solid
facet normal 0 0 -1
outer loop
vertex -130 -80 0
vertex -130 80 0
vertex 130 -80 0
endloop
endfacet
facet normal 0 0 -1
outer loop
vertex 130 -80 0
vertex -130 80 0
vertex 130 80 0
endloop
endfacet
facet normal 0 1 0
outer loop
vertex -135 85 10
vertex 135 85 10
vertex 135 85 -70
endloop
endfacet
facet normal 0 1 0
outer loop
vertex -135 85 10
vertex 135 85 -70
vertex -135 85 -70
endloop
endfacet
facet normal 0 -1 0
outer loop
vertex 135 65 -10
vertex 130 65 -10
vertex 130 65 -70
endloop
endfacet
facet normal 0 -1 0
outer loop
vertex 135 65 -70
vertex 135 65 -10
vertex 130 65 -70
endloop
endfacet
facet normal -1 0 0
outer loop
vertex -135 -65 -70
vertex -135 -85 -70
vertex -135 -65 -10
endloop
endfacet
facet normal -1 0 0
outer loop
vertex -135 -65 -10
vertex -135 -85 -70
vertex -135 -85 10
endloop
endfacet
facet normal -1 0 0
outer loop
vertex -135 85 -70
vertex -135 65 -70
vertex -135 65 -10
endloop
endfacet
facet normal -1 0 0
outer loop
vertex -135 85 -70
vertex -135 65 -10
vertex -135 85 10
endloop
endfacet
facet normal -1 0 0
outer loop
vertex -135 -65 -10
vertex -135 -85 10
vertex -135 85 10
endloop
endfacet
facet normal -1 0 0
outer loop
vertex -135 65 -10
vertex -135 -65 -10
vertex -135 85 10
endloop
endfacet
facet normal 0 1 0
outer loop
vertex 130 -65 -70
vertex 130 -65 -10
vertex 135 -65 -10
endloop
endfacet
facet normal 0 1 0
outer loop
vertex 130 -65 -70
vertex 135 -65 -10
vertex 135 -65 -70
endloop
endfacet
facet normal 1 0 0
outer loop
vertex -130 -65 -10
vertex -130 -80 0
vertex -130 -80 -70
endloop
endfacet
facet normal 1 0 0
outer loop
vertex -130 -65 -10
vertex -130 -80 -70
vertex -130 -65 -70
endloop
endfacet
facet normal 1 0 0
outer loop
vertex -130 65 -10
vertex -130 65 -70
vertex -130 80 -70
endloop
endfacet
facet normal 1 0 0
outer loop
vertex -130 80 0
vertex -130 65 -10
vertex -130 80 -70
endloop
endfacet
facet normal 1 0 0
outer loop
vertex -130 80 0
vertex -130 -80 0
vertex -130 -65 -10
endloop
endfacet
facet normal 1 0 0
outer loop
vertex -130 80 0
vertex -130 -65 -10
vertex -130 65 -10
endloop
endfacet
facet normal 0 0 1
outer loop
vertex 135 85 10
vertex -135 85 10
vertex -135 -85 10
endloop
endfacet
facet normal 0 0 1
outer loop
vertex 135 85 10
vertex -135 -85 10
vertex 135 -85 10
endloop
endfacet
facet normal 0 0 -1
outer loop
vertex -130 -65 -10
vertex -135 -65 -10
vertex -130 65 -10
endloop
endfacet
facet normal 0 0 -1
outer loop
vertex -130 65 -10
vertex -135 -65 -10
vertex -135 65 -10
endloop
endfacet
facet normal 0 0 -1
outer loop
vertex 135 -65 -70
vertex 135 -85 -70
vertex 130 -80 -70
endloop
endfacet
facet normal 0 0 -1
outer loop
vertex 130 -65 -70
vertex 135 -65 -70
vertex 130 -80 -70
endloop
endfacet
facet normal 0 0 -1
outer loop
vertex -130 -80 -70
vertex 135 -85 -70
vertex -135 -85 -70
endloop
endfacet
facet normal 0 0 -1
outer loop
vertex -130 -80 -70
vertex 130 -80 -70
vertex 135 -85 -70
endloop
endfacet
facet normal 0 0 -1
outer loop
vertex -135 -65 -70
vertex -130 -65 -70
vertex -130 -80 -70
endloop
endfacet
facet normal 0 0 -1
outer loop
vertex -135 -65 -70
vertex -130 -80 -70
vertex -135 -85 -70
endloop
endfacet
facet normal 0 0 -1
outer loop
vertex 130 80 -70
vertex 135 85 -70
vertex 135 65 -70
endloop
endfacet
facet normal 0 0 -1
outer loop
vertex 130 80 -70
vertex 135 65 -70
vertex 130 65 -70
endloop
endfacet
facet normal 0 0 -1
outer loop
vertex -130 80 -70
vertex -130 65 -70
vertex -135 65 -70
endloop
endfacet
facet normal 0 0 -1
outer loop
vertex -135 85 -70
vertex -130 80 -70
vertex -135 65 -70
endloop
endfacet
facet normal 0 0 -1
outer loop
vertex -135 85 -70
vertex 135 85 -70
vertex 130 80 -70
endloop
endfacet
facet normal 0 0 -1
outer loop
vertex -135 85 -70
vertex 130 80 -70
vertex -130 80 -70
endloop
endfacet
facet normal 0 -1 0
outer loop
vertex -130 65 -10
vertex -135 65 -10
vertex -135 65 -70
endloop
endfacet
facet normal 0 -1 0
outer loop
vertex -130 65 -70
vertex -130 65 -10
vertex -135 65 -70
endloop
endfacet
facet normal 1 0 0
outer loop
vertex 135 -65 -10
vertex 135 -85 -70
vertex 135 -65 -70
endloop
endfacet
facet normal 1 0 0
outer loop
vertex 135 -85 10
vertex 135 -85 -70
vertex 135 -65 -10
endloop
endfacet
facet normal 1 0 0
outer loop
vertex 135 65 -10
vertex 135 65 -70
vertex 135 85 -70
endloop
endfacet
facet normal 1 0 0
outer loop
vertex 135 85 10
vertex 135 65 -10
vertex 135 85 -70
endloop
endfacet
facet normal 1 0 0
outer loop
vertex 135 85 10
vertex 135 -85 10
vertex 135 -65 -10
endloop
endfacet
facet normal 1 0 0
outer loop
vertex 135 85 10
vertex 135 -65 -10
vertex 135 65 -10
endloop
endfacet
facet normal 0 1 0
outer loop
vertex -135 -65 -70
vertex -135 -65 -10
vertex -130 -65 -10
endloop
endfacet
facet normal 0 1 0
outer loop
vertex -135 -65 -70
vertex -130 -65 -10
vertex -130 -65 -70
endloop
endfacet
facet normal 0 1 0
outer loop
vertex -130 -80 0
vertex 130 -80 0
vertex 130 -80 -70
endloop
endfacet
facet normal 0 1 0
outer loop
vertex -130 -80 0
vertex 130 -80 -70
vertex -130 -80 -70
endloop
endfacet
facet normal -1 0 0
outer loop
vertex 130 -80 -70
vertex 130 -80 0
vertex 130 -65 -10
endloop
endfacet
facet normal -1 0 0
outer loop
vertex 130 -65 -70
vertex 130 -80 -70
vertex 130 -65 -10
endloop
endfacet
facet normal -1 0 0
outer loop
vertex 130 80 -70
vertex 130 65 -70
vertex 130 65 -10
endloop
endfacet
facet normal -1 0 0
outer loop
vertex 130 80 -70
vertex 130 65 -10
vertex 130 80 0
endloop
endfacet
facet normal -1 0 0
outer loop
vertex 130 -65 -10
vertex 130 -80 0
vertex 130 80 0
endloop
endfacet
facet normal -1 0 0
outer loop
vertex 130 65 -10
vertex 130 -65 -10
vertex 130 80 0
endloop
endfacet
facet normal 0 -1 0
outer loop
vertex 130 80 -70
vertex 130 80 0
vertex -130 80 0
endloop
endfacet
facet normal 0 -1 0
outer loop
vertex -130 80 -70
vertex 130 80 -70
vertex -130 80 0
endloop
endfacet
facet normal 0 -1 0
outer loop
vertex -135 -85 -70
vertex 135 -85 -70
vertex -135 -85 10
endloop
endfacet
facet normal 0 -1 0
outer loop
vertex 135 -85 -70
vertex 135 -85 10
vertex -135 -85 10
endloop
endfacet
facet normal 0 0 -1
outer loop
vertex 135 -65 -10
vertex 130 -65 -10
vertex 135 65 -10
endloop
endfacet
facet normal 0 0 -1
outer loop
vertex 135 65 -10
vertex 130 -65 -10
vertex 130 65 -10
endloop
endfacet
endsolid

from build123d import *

# Parameters (mm, degrees)
SKETCH_1_W               = 270
SKETCH_1_H               = 170
EXTRUDE_1_DEPTH          = 10
SKETCH_3_W               = 270
SKETCH_3_H               = 170
SKETCH_3_W_2             = 260
SKETCH_3_H_2             = 160
EXTRUDE_2_DEPTH          = 70
CUT_EXTRUDE_1_DEPTH      = 292.590466236
CUT_EXTRUDE_1_DEPTH_BACK = 292.590466236
SKETCH_4_W               = 60
SKETCH_4_H               = 130


with BuildPart() as part:
    # 草图1 → 凸台-拉伸1 (new body)
    with BuildSketch(Plane.XY):
        Rectangle(SKETCH_1_W, SKETCH_1_H)
    extrude(amount=EXTRUDE_1_DEPTH)

    # 草图3 → 凸台-拉伸2 (add)
    with BuildSketch(Plane(origin=(0, 0, 0), x_dir=(-1, 0, 0), z_dir=(0, 0, -1))):
        Rectangle(SKETCH_3_W, SKETCH_3_H)
        Rectangle(SKETCH_3_W_2, SKETCH_3_H_2, mode=Mode.SUBTRACT)
    extrude(amount=EXTRUDE_2_DEPTH)

    # 草图4 → 切除-拉伸1 (cut, two sides: drawn at the far end of the back side and taken through both)
    with BuildSketch(Plane(origin=(135, 0, 0), x_dir=(0, 0, -1), z_dir=(1, 0, 0)).offset(-CUT_EXTRUDE_1_DEPTH_BACK)):
        with Locations((40, 0)):
            Rectangle(SKETCH_4_W, SKETCH_4_H)
    extrude(amount=CUT_EXTRUDE_1_DEPTH + CUT_EXTRUDE_1_DEPTH_BACK, mode=Mode.SUBTRACT)


solid = part.part
